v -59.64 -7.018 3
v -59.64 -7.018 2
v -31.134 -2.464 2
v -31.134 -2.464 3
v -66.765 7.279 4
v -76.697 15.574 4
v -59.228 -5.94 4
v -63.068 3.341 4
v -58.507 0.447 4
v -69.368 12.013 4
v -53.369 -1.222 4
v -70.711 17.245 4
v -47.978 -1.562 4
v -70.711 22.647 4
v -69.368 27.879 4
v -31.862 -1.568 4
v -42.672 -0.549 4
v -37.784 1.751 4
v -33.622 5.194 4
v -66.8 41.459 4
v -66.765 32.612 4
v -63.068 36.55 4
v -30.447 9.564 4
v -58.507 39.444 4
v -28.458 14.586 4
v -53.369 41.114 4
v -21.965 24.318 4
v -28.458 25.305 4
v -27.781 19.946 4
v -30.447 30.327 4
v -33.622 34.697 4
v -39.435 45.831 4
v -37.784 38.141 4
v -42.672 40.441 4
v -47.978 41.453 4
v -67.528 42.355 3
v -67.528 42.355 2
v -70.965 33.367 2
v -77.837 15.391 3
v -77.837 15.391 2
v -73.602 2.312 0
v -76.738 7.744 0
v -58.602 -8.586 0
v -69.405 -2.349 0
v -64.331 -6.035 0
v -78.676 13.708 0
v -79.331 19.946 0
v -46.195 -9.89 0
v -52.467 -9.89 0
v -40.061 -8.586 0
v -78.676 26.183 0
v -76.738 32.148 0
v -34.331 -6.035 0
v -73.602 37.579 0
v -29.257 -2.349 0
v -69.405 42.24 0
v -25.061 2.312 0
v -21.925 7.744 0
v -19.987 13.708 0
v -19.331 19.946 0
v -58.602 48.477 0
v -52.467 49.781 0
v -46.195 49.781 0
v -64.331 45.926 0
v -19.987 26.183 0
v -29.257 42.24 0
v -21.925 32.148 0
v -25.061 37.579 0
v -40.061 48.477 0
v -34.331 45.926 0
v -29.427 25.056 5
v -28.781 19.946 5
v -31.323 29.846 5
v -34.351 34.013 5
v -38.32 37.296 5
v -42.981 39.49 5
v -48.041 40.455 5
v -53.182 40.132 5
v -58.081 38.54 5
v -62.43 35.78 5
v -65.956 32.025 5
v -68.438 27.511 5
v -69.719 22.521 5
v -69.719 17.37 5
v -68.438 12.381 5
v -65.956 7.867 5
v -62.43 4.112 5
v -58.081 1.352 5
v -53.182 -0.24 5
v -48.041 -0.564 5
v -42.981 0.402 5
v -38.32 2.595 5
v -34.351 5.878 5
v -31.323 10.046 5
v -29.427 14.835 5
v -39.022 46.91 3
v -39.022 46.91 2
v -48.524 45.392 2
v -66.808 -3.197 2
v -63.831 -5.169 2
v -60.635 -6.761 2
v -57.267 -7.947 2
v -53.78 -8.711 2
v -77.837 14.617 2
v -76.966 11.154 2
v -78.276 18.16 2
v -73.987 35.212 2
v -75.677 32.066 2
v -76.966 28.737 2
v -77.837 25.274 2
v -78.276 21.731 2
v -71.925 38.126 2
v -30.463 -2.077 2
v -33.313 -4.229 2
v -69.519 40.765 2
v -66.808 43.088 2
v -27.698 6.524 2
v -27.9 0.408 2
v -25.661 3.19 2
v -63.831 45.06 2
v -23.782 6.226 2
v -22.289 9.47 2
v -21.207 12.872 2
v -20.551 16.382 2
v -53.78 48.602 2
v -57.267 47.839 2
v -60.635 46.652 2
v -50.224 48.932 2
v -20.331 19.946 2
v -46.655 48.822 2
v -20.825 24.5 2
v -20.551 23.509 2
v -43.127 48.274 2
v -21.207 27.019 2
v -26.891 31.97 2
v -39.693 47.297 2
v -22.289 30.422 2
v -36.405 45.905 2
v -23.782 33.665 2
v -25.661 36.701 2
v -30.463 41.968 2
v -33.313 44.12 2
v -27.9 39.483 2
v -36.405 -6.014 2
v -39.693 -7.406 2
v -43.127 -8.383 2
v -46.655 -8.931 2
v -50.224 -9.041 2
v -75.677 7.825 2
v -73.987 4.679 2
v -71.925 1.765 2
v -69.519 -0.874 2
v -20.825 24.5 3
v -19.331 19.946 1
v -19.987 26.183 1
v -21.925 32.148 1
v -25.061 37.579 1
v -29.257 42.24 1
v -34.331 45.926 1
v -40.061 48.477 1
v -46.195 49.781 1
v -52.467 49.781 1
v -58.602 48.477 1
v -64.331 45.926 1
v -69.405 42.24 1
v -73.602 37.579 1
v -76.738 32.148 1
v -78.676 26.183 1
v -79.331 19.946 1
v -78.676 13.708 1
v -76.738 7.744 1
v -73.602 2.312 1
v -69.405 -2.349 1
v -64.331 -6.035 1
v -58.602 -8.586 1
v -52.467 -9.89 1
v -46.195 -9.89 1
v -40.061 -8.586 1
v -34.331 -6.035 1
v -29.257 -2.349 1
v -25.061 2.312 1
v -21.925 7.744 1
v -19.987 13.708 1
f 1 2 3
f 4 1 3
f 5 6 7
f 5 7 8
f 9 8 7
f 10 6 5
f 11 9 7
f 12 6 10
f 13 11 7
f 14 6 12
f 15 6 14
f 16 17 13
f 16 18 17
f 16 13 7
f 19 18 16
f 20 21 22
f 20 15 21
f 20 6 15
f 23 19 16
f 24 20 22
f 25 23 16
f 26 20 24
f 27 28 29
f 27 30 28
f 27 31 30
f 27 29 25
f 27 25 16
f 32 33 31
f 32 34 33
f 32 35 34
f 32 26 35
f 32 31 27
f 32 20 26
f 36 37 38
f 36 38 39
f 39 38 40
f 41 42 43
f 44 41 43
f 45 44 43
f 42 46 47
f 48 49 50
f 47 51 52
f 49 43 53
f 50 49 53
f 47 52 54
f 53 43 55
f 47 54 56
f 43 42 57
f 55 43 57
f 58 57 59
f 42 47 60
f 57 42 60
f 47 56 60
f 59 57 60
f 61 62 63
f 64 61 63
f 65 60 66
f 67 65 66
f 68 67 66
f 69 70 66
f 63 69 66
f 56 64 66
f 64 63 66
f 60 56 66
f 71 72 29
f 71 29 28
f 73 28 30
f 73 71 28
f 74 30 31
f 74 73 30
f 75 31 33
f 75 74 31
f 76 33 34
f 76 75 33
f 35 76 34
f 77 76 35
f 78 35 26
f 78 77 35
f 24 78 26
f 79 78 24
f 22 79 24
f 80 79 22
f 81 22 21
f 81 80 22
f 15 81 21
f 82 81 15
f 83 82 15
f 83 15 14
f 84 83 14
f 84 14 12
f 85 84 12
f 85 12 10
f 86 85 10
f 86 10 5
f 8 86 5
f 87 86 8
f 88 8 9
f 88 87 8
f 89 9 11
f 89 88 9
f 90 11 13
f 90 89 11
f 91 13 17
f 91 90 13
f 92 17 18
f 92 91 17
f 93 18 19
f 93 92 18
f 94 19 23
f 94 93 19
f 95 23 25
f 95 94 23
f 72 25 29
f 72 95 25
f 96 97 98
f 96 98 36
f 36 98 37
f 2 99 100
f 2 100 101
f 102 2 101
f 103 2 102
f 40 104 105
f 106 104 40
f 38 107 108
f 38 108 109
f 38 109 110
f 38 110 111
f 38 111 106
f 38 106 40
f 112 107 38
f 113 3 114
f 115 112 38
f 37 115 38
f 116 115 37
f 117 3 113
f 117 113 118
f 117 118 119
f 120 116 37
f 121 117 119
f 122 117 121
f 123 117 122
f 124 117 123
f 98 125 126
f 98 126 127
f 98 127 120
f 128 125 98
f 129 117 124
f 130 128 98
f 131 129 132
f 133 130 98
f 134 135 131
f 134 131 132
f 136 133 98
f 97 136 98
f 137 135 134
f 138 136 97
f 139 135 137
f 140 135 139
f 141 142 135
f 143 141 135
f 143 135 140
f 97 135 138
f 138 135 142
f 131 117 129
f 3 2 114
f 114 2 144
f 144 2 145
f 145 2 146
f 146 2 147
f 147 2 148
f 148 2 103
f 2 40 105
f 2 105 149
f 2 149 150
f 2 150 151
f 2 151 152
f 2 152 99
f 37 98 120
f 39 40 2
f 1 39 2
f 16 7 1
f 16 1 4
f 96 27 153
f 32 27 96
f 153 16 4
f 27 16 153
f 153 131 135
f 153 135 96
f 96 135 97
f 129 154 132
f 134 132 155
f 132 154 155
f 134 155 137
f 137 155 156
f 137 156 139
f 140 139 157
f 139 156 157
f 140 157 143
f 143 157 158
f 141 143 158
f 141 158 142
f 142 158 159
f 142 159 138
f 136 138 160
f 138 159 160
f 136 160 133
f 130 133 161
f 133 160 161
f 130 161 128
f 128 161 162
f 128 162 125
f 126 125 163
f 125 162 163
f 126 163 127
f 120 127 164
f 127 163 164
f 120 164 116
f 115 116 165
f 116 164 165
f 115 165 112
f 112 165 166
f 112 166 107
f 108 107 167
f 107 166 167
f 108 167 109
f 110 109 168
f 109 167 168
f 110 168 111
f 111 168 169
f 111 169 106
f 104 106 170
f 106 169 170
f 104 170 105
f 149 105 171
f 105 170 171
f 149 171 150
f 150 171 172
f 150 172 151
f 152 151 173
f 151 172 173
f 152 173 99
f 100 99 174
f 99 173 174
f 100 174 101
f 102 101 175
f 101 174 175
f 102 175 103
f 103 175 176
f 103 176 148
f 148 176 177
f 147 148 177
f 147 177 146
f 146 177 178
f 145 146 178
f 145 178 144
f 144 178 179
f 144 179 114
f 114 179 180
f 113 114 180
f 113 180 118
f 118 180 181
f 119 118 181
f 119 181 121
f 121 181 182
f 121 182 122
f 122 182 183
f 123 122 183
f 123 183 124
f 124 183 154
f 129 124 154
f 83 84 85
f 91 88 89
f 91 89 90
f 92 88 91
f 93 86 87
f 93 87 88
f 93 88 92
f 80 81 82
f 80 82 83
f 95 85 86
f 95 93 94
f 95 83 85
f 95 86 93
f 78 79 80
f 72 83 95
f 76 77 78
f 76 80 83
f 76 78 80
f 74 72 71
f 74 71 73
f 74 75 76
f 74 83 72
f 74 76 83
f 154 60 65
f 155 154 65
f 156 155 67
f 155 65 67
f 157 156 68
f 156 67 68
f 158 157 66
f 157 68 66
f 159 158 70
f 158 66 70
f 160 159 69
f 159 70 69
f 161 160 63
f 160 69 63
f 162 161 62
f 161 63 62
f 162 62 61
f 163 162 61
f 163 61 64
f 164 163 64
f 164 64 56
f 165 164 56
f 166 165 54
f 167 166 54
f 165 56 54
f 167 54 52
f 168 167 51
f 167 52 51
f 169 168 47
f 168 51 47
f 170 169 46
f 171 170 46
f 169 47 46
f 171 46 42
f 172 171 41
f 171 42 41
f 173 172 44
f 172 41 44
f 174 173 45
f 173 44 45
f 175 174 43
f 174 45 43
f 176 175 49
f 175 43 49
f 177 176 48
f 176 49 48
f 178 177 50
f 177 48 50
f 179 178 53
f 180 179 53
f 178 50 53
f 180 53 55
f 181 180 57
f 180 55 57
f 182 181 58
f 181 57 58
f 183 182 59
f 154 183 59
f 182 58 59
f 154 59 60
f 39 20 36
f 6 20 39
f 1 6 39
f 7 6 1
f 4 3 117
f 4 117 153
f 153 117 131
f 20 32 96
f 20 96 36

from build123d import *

# Parameters (mm, degrees)
SKETCH_1_R      = 30
EXTRUDE_1_DEPTH = 2
EXTRUDE_2_DEPTH = 2
SKETCH_3_R      = 21.549788195
EXTRUDE_3_DEPTH = 1
CHAMFER_1_SIZE  = 1
CHAMFER_2_SIZE  = 1
CHAMFER_3_SIZE  = 1


with BuildPart() as part:
    # Эскиз1 → Бобышка-Вытянуть1 (new body)
    with BuildSketch(Plane.XY):
        with Locations((-49.331170663, 19.945627645)):
            Circle(SKETCH_1_R)
    extrude(amount=EXTRUDE_1_DEPTH)

    # Эскиз2 → Бобышка-Вытянуть2 (add)
    with BuildSketch(Plane.XY.offset(2)):
        Polygon((-20.825153864, 24.499783942), (-39.02217731, 46.909640502), (-67.528194109, 42.355484205), (-77.837187462, 15.391471347), (-59.640164016, -7.018385213), (-31.134147217, -2.464228916), align=None)
    extrude(amount=EXTRUDE_2_DEPTH)

    # Эскиз3 → Бобышка-Вытянуть3 (add)
    with BuildSketch(Plane.XY.offset(4)):
        with Locations((-49.331170663, 19.945627645)):
            Circle(SKETCH_3_R)
    extrude(amount=EXTRUDE_3_DEPTH)

    # Фаска1
    chamfer_1_edges = [part.edges().sort_by_distance(p)[0] for p in [
        (-25.97965054, 11.017777513, 4),
        (-29.923665587, 35.704712222, 4),
        (-53.275185709, 44.632562353, 4),
        (-72.682690785, 28.873477776, 4),
        (-68.738675739, 4.186543067, 4),
        (-45.387155617, -4.741307064, 4),
    ]]
    chamfer(chamfer_1_edges, length=CHAMFER_1_SIZE)

    # Фаска2
    chamfer_2_edges = [part.edges().sort_by_distance(p)[0] for p in [
        (-70.880958858, 19.945627645, 5),
    ]]
    chamfer(chamfer_2_edges, length=CHAMFER_2_SIZE - 0.0001)  # a hair under: the kernel refuses the full size

    # Фаска3
    chamfer_3_edges = [part.edges().sort_by_distance(p)[0] for p in [
        (-79.331170663, 19.945627645, 2),
    ]]
    chamfer(chamfer_3_edges, length=CHAMFER_3_SIZE)


solid = part.part
